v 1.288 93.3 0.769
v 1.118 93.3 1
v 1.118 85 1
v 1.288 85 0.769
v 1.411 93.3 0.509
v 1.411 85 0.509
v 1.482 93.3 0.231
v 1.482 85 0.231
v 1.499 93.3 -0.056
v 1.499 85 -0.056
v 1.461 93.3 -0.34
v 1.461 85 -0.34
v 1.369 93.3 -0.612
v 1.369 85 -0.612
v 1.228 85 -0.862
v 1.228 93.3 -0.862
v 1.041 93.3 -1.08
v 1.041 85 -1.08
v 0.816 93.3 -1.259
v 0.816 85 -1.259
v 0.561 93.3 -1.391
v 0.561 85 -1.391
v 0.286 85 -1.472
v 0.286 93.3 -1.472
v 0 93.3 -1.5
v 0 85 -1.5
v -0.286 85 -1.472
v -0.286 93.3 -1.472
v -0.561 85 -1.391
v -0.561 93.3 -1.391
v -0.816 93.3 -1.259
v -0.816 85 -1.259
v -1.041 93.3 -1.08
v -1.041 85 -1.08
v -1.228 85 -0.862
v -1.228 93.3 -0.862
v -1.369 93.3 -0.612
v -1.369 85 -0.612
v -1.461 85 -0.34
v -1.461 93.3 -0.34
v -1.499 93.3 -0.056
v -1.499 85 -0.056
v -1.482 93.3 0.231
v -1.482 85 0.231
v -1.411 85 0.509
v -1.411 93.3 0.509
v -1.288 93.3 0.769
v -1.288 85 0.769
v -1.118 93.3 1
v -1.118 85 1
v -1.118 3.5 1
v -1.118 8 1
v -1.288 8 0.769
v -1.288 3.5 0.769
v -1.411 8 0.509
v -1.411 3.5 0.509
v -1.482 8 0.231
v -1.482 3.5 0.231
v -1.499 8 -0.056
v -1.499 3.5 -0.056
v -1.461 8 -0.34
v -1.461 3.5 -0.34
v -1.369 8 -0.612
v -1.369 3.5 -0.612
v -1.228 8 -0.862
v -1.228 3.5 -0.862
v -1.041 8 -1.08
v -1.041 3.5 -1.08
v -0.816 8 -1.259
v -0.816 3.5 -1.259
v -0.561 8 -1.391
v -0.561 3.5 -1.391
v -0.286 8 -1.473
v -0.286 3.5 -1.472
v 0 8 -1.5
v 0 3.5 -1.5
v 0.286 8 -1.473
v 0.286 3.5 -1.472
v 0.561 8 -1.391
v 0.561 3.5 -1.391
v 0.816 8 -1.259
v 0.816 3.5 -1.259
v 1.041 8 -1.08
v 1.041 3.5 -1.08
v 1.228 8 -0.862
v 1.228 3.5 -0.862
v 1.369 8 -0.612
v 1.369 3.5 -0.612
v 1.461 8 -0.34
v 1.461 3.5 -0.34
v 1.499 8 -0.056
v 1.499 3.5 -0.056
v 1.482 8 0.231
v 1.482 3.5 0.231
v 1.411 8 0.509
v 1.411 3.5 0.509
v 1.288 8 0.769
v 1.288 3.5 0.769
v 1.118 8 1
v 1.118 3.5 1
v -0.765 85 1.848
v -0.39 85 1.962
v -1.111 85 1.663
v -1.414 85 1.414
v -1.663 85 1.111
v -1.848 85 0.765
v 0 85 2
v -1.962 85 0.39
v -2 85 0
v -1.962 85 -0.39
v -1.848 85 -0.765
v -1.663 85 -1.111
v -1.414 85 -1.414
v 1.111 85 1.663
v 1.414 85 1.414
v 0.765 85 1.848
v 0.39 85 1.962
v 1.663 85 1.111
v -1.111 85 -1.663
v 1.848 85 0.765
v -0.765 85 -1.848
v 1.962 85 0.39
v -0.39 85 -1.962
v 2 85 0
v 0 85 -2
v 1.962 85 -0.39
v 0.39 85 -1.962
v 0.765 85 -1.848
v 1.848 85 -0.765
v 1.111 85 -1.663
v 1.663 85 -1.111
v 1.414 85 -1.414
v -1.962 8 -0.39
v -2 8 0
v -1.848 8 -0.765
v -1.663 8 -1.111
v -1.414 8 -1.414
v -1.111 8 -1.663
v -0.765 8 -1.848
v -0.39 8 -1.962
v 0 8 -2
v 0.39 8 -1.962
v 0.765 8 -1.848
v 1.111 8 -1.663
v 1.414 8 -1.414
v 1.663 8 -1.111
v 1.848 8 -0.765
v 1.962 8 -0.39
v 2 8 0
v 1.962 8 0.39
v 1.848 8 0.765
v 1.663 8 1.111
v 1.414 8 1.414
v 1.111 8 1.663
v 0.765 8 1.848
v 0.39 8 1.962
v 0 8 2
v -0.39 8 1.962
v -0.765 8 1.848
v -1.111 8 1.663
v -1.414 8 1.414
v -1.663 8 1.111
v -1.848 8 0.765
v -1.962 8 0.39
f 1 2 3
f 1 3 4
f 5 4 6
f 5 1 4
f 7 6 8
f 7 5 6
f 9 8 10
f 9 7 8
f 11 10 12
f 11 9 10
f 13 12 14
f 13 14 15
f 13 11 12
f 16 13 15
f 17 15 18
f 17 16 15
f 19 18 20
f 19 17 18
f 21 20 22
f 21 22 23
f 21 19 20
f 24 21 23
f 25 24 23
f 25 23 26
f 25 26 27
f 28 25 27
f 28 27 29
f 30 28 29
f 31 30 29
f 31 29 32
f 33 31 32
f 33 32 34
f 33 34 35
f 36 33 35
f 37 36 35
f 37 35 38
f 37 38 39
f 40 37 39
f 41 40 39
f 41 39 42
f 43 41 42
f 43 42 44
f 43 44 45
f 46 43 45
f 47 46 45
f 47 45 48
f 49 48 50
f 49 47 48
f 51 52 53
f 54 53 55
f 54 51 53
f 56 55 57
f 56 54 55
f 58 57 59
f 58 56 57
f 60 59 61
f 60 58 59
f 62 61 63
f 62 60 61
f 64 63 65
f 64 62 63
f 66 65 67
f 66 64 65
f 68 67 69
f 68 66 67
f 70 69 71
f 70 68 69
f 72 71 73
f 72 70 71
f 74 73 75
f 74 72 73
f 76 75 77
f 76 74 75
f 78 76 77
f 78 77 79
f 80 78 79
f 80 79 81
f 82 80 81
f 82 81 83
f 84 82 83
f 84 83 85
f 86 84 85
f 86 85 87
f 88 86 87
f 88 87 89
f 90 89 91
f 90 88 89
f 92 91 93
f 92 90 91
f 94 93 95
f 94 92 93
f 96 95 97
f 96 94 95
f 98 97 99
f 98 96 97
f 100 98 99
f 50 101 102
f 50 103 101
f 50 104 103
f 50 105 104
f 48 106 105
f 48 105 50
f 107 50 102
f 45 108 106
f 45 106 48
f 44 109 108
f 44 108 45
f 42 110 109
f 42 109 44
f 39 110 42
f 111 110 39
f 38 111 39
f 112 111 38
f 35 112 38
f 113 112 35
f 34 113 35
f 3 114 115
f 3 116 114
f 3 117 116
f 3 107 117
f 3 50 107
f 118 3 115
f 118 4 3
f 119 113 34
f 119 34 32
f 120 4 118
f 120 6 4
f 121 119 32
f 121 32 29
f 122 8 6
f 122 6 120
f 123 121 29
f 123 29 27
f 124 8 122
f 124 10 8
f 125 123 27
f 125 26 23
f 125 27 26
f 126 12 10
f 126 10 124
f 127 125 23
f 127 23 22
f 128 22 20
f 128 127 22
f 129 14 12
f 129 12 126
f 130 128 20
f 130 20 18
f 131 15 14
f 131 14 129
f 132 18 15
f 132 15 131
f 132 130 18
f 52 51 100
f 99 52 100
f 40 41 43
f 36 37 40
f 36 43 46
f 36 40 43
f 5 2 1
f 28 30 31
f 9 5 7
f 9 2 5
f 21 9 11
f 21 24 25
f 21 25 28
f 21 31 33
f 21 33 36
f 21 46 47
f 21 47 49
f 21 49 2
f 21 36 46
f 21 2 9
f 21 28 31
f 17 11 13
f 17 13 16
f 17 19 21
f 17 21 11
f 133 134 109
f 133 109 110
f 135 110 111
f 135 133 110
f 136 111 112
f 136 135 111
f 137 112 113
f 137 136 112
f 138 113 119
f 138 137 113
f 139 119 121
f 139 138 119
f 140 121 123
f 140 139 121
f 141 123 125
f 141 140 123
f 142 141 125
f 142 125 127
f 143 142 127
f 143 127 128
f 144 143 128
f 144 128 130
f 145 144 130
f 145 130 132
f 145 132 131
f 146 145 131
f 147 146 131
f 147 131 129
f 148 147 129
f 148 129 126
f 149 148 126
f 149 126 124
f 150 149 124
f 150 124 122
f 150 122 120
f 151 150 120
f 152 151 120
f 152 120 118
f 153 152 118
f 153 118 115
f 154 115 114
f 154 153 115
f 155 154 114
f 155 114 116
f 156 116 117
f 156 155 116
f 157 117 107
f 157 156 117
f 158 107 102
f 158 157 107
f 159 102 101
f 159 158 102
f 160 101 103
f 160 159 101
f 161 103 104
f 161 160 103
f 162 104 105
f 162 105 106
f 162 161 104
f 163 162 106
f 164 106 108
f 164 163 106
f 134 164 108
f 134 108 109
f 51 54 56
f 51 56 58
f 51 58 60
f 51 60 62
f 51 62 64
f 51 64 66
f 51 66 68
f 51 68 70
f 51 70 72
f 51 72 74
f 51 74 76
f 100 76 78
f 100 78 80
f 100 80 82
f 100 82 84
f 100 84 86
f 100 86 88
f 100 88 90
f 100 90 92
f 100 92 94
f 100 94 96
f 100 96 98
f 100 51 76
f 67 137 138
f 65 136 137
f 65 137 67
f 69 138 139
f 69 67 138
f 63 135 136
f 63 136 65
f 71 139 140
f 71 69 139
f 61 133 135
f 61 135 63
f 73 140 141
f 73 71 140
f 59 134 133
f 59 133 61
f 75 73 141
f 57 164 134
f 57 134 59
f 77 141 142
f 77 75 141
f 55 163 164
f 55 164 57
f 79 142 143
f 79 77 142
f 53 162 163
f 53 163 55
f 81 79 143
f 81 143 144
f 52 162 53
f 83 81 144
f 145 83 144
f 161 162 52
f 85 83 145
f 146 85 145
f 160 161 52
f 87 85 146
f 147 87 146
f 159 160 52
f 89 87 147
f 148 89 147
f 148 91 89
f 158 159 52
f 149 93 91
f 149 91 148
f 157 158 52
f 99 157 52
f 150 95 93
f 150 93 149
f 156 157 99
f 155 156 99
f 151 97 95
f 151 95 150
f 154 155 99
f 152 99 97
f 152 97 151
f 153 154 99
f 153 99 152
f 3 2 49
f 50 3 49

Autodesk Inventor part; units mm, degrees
ref_plane "YZ Plane" through (0, 0, 0) normal (1, 0, 0) x (0, 1, 0)
ref_plane "XZ Plane" through (0, 0, 0) normal (0, 1, 0) x (-1, 0, 0)
ref_plane "XY Plane" through (0, 0, 0) normal (0, 0, 1) x (1, 0, 0)
sketch "スケッチ1" plane through (0, 0, 0) normal (0, 1, 0) x (-1, 0, 0)
  circle A0 centre (0, 0) radius 2
  dimension "d0" = 4
extrude "押し出し1" add sketch "スケッチ1" along normal blind 97
sketch "スケッチ2" plane through (0, 0, 0) normal (0, -1, 0) x (1, 0, 0)
  circle A0 centre (0, 0) radius 1.5
  line L0 (-1.118, 1) -> (1.118, 1)
  circle A1 centre (0, 0) radius 2 projected
  circle A2 centre (0, 0) radius 2 projected
  dimension "d3" = 3
  dimension "d4" = 1
extrude "押し出し2" cut sketch "スケッチ2" against normal blind 8 contours L0 A0 | A1 picked at (-0.0599, 1.1631)
sketch "スケッチ3" plane through (0, 97, 0) normal (0, 1, 0) x (1, 0, 0)
  arc A0 (1.118, -1) -> (-1.118, -1) centre (0, 0) ccw projected
  line L0 (1.118, -1) -> (-1.118, -1) projected
  circle A1 centre (0, 0) radius 2 projected
extrude "押し出し3" cut sketch "スケッチ3" against normal blind 12
sketch "スケッチ4" plane through (0, 97, 0) normal (0, 1, 0) x (1, 0, 0)
  arc A0 (1.118, -1) -> (-1.118, -1) centre (0, 0) ccw projected
  line L0 (-1.118, -1) -> (1.118, -1) projected
extrude "押し出し4" cut sketch "スケッチ4" against normal blind 3.7
sketch "スケッチ5" plane through (0, 0, 0) normal (0, -1, 0) x (1, 0, 0)
  line L0 (1.118, 1) -> (-1.118, 1) projected
  arc A0 (-1.118, 1) -> (1.118, 1) centre (0, 0) ccw projected
extrude "押し出し5" cut sketch "スケッチ5" against normal blind 3.5
properties part number "screw_screw" material "アルミニウム 6061"
